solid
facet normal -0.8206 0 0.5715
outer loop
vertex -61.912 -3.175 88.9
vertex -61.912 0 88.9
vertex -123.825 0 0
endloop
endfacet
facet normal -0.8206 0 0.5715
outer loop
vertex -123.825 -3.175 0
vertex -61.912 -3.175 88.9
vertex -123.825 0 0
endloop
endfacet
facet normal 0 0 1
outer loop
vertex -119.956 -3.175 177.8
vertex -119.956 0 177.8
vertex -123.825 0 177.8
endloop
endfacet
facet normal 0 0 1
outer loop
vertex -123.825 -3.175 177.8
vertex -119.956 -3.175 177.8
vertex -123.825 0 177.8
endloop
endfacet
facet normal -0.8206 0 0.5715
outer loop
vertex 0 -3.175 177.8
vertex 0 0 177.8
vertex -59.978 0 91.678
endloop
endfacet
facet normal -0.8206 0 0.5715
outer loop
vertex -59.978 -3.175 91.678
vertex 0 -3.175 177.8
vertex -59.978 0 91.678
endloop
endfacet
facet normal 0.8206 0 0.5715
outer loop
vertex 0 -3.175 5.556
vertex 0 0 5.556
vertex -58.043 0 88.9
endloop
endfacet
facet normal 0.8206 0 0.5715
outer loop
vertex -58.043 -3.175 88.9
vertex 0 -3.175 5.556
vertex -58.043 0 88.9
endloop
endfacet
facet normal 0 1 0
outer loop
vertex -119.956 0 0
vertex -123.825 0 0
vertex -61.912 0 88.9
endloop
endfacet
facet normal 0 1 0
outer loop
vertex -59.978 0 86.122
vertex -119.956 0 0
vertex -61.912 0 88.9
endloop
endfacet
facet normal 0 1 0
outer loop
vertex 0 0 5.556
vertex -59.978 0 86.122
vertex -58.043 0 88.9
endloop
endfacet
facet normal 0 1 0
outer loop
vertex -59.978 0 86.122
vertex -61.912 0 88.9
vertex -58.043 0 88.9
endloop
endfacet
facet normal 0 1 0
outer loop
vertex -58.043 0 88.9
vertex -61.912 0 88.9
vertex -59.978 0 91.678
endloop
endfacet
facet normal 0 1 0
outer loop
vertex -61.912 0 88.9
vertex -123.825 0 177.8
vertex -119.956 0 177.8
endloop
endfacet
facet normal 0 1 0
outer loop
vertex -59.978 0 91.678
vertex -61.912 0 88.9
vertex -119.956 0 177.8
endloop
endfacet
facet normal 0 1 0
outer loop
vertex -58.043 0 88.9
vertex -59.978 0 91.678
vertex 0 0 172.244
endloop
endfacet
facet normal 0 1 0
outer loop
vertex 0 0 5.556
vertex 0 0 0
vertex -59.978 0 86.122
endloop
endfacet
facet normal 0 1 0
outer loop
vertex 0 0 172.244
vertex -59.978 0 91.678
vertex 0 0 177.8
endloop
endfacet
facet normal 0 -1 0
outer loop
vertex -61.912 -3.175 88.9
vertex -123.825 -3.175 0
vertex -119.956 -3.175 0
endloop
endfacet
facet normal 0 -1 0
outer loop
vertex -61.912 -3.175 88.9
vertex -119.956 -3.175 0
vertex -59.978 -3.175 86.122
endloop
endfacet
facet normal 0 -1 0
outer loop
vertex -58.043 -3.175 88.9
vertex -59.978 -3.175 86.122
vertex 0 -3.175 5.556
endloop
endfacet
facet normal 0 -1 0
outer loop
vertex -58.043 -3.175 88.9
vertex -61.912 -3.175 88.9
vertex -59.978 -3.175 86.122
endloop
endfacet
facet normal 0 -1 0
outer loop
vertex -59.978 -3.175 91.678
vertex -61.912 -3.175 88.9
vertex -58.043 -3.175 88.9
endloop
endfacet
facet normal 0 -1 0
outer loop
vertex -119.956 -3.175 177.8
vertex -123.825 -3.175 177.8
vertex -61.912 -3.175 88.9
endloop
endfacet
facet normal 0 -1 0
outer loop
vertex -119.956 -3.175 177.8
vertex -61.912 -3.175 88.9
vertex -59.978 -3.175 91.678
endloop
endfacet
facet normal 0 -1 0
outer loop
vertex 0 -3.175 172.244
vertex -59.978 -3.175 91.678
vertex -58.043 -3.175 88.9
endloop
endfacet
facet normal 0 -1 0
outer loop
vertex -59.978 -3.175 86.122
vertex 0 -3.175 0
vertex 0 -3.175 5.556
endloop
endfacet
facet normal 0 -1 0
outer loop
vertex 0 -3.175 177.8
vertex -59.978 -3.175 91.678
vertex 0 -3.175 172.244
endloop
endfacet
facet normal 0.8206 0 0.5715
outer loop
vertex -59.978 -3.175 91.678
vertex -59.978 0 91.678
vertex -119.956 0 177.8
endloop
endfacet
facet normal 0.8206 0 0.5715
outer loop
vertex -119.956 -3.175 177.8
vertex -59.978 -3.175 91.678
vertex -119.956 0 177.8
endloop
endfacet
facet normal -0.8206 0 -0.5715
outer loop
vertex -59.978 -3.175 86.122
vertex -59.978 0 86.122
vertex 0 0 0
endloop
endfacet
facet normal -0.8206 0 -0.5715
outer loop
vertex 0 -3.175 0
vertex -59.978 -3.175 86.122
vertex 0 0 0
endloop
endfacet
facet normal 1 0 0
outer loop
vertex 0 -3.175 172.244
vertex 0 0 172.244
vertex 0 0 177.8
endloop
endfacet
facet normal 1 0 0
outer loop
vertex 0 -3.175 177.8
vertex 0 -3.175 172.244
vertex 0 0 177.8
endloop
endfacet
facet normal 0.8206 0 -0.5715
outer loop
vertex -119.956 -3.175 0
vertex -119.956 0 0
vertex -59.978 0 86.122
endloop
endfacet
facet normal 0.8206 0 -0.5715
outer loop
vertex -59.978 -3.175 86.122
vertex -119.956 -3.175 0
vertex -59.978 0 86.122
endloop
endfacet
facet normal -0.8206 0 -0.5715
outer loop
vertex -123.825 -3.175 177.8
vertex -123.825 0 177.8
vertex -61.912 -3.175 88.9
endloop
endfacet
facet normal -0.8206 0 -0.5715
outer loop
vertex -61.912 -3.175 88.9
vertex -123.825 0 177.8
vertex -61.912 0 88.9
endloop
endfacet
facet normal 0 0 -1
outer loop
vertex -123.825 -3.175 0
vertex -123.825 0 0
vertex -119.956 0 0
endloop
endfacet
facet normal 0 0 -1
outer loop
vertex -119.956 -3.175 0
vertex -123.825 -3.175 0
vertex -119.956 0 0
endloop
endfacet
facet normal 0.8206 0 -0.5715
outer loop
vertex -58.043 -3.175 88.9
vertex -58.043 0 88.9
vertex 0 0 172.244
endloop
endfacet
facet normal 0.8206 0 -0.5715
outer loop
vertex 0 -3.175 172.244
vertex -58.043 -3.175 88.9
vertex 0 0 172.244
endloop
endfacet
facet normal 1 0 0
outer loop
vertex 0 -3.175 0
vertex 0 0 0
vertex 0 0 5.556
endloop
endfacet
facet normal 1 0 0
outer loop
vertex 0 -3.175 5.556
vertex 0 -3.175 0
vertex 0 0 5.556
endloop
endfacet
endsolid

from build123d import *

# Parameters (mm, degrees)
F1_DEPTH = 3.175


with BuildPart() as f1:
    # F0 (on Front) → F1 (new body)
    with BuildSketch(Plane.XZ):
        Polygon((-119.95591, 177.8), (-123.825, 177.8), (-61.9125, 88.9), (-59.977955, 91.677808), align=None)
        Polygon((-59.977955, 86.122192), (0, 0), (0, 5.555616), (-58.04341, 88.9), align=None)
        Polygon((-123.825, 0), (-119.95591, 0), (-59.977955, 86.122192), (-58.04341, 88.9), (0, 172.244384), (0, 177.8), (-59.977955, 91.677808), (-61.9125, 88.9), align=None)
    extrude(amount=F1_DEPTH)


solid = f1.part
